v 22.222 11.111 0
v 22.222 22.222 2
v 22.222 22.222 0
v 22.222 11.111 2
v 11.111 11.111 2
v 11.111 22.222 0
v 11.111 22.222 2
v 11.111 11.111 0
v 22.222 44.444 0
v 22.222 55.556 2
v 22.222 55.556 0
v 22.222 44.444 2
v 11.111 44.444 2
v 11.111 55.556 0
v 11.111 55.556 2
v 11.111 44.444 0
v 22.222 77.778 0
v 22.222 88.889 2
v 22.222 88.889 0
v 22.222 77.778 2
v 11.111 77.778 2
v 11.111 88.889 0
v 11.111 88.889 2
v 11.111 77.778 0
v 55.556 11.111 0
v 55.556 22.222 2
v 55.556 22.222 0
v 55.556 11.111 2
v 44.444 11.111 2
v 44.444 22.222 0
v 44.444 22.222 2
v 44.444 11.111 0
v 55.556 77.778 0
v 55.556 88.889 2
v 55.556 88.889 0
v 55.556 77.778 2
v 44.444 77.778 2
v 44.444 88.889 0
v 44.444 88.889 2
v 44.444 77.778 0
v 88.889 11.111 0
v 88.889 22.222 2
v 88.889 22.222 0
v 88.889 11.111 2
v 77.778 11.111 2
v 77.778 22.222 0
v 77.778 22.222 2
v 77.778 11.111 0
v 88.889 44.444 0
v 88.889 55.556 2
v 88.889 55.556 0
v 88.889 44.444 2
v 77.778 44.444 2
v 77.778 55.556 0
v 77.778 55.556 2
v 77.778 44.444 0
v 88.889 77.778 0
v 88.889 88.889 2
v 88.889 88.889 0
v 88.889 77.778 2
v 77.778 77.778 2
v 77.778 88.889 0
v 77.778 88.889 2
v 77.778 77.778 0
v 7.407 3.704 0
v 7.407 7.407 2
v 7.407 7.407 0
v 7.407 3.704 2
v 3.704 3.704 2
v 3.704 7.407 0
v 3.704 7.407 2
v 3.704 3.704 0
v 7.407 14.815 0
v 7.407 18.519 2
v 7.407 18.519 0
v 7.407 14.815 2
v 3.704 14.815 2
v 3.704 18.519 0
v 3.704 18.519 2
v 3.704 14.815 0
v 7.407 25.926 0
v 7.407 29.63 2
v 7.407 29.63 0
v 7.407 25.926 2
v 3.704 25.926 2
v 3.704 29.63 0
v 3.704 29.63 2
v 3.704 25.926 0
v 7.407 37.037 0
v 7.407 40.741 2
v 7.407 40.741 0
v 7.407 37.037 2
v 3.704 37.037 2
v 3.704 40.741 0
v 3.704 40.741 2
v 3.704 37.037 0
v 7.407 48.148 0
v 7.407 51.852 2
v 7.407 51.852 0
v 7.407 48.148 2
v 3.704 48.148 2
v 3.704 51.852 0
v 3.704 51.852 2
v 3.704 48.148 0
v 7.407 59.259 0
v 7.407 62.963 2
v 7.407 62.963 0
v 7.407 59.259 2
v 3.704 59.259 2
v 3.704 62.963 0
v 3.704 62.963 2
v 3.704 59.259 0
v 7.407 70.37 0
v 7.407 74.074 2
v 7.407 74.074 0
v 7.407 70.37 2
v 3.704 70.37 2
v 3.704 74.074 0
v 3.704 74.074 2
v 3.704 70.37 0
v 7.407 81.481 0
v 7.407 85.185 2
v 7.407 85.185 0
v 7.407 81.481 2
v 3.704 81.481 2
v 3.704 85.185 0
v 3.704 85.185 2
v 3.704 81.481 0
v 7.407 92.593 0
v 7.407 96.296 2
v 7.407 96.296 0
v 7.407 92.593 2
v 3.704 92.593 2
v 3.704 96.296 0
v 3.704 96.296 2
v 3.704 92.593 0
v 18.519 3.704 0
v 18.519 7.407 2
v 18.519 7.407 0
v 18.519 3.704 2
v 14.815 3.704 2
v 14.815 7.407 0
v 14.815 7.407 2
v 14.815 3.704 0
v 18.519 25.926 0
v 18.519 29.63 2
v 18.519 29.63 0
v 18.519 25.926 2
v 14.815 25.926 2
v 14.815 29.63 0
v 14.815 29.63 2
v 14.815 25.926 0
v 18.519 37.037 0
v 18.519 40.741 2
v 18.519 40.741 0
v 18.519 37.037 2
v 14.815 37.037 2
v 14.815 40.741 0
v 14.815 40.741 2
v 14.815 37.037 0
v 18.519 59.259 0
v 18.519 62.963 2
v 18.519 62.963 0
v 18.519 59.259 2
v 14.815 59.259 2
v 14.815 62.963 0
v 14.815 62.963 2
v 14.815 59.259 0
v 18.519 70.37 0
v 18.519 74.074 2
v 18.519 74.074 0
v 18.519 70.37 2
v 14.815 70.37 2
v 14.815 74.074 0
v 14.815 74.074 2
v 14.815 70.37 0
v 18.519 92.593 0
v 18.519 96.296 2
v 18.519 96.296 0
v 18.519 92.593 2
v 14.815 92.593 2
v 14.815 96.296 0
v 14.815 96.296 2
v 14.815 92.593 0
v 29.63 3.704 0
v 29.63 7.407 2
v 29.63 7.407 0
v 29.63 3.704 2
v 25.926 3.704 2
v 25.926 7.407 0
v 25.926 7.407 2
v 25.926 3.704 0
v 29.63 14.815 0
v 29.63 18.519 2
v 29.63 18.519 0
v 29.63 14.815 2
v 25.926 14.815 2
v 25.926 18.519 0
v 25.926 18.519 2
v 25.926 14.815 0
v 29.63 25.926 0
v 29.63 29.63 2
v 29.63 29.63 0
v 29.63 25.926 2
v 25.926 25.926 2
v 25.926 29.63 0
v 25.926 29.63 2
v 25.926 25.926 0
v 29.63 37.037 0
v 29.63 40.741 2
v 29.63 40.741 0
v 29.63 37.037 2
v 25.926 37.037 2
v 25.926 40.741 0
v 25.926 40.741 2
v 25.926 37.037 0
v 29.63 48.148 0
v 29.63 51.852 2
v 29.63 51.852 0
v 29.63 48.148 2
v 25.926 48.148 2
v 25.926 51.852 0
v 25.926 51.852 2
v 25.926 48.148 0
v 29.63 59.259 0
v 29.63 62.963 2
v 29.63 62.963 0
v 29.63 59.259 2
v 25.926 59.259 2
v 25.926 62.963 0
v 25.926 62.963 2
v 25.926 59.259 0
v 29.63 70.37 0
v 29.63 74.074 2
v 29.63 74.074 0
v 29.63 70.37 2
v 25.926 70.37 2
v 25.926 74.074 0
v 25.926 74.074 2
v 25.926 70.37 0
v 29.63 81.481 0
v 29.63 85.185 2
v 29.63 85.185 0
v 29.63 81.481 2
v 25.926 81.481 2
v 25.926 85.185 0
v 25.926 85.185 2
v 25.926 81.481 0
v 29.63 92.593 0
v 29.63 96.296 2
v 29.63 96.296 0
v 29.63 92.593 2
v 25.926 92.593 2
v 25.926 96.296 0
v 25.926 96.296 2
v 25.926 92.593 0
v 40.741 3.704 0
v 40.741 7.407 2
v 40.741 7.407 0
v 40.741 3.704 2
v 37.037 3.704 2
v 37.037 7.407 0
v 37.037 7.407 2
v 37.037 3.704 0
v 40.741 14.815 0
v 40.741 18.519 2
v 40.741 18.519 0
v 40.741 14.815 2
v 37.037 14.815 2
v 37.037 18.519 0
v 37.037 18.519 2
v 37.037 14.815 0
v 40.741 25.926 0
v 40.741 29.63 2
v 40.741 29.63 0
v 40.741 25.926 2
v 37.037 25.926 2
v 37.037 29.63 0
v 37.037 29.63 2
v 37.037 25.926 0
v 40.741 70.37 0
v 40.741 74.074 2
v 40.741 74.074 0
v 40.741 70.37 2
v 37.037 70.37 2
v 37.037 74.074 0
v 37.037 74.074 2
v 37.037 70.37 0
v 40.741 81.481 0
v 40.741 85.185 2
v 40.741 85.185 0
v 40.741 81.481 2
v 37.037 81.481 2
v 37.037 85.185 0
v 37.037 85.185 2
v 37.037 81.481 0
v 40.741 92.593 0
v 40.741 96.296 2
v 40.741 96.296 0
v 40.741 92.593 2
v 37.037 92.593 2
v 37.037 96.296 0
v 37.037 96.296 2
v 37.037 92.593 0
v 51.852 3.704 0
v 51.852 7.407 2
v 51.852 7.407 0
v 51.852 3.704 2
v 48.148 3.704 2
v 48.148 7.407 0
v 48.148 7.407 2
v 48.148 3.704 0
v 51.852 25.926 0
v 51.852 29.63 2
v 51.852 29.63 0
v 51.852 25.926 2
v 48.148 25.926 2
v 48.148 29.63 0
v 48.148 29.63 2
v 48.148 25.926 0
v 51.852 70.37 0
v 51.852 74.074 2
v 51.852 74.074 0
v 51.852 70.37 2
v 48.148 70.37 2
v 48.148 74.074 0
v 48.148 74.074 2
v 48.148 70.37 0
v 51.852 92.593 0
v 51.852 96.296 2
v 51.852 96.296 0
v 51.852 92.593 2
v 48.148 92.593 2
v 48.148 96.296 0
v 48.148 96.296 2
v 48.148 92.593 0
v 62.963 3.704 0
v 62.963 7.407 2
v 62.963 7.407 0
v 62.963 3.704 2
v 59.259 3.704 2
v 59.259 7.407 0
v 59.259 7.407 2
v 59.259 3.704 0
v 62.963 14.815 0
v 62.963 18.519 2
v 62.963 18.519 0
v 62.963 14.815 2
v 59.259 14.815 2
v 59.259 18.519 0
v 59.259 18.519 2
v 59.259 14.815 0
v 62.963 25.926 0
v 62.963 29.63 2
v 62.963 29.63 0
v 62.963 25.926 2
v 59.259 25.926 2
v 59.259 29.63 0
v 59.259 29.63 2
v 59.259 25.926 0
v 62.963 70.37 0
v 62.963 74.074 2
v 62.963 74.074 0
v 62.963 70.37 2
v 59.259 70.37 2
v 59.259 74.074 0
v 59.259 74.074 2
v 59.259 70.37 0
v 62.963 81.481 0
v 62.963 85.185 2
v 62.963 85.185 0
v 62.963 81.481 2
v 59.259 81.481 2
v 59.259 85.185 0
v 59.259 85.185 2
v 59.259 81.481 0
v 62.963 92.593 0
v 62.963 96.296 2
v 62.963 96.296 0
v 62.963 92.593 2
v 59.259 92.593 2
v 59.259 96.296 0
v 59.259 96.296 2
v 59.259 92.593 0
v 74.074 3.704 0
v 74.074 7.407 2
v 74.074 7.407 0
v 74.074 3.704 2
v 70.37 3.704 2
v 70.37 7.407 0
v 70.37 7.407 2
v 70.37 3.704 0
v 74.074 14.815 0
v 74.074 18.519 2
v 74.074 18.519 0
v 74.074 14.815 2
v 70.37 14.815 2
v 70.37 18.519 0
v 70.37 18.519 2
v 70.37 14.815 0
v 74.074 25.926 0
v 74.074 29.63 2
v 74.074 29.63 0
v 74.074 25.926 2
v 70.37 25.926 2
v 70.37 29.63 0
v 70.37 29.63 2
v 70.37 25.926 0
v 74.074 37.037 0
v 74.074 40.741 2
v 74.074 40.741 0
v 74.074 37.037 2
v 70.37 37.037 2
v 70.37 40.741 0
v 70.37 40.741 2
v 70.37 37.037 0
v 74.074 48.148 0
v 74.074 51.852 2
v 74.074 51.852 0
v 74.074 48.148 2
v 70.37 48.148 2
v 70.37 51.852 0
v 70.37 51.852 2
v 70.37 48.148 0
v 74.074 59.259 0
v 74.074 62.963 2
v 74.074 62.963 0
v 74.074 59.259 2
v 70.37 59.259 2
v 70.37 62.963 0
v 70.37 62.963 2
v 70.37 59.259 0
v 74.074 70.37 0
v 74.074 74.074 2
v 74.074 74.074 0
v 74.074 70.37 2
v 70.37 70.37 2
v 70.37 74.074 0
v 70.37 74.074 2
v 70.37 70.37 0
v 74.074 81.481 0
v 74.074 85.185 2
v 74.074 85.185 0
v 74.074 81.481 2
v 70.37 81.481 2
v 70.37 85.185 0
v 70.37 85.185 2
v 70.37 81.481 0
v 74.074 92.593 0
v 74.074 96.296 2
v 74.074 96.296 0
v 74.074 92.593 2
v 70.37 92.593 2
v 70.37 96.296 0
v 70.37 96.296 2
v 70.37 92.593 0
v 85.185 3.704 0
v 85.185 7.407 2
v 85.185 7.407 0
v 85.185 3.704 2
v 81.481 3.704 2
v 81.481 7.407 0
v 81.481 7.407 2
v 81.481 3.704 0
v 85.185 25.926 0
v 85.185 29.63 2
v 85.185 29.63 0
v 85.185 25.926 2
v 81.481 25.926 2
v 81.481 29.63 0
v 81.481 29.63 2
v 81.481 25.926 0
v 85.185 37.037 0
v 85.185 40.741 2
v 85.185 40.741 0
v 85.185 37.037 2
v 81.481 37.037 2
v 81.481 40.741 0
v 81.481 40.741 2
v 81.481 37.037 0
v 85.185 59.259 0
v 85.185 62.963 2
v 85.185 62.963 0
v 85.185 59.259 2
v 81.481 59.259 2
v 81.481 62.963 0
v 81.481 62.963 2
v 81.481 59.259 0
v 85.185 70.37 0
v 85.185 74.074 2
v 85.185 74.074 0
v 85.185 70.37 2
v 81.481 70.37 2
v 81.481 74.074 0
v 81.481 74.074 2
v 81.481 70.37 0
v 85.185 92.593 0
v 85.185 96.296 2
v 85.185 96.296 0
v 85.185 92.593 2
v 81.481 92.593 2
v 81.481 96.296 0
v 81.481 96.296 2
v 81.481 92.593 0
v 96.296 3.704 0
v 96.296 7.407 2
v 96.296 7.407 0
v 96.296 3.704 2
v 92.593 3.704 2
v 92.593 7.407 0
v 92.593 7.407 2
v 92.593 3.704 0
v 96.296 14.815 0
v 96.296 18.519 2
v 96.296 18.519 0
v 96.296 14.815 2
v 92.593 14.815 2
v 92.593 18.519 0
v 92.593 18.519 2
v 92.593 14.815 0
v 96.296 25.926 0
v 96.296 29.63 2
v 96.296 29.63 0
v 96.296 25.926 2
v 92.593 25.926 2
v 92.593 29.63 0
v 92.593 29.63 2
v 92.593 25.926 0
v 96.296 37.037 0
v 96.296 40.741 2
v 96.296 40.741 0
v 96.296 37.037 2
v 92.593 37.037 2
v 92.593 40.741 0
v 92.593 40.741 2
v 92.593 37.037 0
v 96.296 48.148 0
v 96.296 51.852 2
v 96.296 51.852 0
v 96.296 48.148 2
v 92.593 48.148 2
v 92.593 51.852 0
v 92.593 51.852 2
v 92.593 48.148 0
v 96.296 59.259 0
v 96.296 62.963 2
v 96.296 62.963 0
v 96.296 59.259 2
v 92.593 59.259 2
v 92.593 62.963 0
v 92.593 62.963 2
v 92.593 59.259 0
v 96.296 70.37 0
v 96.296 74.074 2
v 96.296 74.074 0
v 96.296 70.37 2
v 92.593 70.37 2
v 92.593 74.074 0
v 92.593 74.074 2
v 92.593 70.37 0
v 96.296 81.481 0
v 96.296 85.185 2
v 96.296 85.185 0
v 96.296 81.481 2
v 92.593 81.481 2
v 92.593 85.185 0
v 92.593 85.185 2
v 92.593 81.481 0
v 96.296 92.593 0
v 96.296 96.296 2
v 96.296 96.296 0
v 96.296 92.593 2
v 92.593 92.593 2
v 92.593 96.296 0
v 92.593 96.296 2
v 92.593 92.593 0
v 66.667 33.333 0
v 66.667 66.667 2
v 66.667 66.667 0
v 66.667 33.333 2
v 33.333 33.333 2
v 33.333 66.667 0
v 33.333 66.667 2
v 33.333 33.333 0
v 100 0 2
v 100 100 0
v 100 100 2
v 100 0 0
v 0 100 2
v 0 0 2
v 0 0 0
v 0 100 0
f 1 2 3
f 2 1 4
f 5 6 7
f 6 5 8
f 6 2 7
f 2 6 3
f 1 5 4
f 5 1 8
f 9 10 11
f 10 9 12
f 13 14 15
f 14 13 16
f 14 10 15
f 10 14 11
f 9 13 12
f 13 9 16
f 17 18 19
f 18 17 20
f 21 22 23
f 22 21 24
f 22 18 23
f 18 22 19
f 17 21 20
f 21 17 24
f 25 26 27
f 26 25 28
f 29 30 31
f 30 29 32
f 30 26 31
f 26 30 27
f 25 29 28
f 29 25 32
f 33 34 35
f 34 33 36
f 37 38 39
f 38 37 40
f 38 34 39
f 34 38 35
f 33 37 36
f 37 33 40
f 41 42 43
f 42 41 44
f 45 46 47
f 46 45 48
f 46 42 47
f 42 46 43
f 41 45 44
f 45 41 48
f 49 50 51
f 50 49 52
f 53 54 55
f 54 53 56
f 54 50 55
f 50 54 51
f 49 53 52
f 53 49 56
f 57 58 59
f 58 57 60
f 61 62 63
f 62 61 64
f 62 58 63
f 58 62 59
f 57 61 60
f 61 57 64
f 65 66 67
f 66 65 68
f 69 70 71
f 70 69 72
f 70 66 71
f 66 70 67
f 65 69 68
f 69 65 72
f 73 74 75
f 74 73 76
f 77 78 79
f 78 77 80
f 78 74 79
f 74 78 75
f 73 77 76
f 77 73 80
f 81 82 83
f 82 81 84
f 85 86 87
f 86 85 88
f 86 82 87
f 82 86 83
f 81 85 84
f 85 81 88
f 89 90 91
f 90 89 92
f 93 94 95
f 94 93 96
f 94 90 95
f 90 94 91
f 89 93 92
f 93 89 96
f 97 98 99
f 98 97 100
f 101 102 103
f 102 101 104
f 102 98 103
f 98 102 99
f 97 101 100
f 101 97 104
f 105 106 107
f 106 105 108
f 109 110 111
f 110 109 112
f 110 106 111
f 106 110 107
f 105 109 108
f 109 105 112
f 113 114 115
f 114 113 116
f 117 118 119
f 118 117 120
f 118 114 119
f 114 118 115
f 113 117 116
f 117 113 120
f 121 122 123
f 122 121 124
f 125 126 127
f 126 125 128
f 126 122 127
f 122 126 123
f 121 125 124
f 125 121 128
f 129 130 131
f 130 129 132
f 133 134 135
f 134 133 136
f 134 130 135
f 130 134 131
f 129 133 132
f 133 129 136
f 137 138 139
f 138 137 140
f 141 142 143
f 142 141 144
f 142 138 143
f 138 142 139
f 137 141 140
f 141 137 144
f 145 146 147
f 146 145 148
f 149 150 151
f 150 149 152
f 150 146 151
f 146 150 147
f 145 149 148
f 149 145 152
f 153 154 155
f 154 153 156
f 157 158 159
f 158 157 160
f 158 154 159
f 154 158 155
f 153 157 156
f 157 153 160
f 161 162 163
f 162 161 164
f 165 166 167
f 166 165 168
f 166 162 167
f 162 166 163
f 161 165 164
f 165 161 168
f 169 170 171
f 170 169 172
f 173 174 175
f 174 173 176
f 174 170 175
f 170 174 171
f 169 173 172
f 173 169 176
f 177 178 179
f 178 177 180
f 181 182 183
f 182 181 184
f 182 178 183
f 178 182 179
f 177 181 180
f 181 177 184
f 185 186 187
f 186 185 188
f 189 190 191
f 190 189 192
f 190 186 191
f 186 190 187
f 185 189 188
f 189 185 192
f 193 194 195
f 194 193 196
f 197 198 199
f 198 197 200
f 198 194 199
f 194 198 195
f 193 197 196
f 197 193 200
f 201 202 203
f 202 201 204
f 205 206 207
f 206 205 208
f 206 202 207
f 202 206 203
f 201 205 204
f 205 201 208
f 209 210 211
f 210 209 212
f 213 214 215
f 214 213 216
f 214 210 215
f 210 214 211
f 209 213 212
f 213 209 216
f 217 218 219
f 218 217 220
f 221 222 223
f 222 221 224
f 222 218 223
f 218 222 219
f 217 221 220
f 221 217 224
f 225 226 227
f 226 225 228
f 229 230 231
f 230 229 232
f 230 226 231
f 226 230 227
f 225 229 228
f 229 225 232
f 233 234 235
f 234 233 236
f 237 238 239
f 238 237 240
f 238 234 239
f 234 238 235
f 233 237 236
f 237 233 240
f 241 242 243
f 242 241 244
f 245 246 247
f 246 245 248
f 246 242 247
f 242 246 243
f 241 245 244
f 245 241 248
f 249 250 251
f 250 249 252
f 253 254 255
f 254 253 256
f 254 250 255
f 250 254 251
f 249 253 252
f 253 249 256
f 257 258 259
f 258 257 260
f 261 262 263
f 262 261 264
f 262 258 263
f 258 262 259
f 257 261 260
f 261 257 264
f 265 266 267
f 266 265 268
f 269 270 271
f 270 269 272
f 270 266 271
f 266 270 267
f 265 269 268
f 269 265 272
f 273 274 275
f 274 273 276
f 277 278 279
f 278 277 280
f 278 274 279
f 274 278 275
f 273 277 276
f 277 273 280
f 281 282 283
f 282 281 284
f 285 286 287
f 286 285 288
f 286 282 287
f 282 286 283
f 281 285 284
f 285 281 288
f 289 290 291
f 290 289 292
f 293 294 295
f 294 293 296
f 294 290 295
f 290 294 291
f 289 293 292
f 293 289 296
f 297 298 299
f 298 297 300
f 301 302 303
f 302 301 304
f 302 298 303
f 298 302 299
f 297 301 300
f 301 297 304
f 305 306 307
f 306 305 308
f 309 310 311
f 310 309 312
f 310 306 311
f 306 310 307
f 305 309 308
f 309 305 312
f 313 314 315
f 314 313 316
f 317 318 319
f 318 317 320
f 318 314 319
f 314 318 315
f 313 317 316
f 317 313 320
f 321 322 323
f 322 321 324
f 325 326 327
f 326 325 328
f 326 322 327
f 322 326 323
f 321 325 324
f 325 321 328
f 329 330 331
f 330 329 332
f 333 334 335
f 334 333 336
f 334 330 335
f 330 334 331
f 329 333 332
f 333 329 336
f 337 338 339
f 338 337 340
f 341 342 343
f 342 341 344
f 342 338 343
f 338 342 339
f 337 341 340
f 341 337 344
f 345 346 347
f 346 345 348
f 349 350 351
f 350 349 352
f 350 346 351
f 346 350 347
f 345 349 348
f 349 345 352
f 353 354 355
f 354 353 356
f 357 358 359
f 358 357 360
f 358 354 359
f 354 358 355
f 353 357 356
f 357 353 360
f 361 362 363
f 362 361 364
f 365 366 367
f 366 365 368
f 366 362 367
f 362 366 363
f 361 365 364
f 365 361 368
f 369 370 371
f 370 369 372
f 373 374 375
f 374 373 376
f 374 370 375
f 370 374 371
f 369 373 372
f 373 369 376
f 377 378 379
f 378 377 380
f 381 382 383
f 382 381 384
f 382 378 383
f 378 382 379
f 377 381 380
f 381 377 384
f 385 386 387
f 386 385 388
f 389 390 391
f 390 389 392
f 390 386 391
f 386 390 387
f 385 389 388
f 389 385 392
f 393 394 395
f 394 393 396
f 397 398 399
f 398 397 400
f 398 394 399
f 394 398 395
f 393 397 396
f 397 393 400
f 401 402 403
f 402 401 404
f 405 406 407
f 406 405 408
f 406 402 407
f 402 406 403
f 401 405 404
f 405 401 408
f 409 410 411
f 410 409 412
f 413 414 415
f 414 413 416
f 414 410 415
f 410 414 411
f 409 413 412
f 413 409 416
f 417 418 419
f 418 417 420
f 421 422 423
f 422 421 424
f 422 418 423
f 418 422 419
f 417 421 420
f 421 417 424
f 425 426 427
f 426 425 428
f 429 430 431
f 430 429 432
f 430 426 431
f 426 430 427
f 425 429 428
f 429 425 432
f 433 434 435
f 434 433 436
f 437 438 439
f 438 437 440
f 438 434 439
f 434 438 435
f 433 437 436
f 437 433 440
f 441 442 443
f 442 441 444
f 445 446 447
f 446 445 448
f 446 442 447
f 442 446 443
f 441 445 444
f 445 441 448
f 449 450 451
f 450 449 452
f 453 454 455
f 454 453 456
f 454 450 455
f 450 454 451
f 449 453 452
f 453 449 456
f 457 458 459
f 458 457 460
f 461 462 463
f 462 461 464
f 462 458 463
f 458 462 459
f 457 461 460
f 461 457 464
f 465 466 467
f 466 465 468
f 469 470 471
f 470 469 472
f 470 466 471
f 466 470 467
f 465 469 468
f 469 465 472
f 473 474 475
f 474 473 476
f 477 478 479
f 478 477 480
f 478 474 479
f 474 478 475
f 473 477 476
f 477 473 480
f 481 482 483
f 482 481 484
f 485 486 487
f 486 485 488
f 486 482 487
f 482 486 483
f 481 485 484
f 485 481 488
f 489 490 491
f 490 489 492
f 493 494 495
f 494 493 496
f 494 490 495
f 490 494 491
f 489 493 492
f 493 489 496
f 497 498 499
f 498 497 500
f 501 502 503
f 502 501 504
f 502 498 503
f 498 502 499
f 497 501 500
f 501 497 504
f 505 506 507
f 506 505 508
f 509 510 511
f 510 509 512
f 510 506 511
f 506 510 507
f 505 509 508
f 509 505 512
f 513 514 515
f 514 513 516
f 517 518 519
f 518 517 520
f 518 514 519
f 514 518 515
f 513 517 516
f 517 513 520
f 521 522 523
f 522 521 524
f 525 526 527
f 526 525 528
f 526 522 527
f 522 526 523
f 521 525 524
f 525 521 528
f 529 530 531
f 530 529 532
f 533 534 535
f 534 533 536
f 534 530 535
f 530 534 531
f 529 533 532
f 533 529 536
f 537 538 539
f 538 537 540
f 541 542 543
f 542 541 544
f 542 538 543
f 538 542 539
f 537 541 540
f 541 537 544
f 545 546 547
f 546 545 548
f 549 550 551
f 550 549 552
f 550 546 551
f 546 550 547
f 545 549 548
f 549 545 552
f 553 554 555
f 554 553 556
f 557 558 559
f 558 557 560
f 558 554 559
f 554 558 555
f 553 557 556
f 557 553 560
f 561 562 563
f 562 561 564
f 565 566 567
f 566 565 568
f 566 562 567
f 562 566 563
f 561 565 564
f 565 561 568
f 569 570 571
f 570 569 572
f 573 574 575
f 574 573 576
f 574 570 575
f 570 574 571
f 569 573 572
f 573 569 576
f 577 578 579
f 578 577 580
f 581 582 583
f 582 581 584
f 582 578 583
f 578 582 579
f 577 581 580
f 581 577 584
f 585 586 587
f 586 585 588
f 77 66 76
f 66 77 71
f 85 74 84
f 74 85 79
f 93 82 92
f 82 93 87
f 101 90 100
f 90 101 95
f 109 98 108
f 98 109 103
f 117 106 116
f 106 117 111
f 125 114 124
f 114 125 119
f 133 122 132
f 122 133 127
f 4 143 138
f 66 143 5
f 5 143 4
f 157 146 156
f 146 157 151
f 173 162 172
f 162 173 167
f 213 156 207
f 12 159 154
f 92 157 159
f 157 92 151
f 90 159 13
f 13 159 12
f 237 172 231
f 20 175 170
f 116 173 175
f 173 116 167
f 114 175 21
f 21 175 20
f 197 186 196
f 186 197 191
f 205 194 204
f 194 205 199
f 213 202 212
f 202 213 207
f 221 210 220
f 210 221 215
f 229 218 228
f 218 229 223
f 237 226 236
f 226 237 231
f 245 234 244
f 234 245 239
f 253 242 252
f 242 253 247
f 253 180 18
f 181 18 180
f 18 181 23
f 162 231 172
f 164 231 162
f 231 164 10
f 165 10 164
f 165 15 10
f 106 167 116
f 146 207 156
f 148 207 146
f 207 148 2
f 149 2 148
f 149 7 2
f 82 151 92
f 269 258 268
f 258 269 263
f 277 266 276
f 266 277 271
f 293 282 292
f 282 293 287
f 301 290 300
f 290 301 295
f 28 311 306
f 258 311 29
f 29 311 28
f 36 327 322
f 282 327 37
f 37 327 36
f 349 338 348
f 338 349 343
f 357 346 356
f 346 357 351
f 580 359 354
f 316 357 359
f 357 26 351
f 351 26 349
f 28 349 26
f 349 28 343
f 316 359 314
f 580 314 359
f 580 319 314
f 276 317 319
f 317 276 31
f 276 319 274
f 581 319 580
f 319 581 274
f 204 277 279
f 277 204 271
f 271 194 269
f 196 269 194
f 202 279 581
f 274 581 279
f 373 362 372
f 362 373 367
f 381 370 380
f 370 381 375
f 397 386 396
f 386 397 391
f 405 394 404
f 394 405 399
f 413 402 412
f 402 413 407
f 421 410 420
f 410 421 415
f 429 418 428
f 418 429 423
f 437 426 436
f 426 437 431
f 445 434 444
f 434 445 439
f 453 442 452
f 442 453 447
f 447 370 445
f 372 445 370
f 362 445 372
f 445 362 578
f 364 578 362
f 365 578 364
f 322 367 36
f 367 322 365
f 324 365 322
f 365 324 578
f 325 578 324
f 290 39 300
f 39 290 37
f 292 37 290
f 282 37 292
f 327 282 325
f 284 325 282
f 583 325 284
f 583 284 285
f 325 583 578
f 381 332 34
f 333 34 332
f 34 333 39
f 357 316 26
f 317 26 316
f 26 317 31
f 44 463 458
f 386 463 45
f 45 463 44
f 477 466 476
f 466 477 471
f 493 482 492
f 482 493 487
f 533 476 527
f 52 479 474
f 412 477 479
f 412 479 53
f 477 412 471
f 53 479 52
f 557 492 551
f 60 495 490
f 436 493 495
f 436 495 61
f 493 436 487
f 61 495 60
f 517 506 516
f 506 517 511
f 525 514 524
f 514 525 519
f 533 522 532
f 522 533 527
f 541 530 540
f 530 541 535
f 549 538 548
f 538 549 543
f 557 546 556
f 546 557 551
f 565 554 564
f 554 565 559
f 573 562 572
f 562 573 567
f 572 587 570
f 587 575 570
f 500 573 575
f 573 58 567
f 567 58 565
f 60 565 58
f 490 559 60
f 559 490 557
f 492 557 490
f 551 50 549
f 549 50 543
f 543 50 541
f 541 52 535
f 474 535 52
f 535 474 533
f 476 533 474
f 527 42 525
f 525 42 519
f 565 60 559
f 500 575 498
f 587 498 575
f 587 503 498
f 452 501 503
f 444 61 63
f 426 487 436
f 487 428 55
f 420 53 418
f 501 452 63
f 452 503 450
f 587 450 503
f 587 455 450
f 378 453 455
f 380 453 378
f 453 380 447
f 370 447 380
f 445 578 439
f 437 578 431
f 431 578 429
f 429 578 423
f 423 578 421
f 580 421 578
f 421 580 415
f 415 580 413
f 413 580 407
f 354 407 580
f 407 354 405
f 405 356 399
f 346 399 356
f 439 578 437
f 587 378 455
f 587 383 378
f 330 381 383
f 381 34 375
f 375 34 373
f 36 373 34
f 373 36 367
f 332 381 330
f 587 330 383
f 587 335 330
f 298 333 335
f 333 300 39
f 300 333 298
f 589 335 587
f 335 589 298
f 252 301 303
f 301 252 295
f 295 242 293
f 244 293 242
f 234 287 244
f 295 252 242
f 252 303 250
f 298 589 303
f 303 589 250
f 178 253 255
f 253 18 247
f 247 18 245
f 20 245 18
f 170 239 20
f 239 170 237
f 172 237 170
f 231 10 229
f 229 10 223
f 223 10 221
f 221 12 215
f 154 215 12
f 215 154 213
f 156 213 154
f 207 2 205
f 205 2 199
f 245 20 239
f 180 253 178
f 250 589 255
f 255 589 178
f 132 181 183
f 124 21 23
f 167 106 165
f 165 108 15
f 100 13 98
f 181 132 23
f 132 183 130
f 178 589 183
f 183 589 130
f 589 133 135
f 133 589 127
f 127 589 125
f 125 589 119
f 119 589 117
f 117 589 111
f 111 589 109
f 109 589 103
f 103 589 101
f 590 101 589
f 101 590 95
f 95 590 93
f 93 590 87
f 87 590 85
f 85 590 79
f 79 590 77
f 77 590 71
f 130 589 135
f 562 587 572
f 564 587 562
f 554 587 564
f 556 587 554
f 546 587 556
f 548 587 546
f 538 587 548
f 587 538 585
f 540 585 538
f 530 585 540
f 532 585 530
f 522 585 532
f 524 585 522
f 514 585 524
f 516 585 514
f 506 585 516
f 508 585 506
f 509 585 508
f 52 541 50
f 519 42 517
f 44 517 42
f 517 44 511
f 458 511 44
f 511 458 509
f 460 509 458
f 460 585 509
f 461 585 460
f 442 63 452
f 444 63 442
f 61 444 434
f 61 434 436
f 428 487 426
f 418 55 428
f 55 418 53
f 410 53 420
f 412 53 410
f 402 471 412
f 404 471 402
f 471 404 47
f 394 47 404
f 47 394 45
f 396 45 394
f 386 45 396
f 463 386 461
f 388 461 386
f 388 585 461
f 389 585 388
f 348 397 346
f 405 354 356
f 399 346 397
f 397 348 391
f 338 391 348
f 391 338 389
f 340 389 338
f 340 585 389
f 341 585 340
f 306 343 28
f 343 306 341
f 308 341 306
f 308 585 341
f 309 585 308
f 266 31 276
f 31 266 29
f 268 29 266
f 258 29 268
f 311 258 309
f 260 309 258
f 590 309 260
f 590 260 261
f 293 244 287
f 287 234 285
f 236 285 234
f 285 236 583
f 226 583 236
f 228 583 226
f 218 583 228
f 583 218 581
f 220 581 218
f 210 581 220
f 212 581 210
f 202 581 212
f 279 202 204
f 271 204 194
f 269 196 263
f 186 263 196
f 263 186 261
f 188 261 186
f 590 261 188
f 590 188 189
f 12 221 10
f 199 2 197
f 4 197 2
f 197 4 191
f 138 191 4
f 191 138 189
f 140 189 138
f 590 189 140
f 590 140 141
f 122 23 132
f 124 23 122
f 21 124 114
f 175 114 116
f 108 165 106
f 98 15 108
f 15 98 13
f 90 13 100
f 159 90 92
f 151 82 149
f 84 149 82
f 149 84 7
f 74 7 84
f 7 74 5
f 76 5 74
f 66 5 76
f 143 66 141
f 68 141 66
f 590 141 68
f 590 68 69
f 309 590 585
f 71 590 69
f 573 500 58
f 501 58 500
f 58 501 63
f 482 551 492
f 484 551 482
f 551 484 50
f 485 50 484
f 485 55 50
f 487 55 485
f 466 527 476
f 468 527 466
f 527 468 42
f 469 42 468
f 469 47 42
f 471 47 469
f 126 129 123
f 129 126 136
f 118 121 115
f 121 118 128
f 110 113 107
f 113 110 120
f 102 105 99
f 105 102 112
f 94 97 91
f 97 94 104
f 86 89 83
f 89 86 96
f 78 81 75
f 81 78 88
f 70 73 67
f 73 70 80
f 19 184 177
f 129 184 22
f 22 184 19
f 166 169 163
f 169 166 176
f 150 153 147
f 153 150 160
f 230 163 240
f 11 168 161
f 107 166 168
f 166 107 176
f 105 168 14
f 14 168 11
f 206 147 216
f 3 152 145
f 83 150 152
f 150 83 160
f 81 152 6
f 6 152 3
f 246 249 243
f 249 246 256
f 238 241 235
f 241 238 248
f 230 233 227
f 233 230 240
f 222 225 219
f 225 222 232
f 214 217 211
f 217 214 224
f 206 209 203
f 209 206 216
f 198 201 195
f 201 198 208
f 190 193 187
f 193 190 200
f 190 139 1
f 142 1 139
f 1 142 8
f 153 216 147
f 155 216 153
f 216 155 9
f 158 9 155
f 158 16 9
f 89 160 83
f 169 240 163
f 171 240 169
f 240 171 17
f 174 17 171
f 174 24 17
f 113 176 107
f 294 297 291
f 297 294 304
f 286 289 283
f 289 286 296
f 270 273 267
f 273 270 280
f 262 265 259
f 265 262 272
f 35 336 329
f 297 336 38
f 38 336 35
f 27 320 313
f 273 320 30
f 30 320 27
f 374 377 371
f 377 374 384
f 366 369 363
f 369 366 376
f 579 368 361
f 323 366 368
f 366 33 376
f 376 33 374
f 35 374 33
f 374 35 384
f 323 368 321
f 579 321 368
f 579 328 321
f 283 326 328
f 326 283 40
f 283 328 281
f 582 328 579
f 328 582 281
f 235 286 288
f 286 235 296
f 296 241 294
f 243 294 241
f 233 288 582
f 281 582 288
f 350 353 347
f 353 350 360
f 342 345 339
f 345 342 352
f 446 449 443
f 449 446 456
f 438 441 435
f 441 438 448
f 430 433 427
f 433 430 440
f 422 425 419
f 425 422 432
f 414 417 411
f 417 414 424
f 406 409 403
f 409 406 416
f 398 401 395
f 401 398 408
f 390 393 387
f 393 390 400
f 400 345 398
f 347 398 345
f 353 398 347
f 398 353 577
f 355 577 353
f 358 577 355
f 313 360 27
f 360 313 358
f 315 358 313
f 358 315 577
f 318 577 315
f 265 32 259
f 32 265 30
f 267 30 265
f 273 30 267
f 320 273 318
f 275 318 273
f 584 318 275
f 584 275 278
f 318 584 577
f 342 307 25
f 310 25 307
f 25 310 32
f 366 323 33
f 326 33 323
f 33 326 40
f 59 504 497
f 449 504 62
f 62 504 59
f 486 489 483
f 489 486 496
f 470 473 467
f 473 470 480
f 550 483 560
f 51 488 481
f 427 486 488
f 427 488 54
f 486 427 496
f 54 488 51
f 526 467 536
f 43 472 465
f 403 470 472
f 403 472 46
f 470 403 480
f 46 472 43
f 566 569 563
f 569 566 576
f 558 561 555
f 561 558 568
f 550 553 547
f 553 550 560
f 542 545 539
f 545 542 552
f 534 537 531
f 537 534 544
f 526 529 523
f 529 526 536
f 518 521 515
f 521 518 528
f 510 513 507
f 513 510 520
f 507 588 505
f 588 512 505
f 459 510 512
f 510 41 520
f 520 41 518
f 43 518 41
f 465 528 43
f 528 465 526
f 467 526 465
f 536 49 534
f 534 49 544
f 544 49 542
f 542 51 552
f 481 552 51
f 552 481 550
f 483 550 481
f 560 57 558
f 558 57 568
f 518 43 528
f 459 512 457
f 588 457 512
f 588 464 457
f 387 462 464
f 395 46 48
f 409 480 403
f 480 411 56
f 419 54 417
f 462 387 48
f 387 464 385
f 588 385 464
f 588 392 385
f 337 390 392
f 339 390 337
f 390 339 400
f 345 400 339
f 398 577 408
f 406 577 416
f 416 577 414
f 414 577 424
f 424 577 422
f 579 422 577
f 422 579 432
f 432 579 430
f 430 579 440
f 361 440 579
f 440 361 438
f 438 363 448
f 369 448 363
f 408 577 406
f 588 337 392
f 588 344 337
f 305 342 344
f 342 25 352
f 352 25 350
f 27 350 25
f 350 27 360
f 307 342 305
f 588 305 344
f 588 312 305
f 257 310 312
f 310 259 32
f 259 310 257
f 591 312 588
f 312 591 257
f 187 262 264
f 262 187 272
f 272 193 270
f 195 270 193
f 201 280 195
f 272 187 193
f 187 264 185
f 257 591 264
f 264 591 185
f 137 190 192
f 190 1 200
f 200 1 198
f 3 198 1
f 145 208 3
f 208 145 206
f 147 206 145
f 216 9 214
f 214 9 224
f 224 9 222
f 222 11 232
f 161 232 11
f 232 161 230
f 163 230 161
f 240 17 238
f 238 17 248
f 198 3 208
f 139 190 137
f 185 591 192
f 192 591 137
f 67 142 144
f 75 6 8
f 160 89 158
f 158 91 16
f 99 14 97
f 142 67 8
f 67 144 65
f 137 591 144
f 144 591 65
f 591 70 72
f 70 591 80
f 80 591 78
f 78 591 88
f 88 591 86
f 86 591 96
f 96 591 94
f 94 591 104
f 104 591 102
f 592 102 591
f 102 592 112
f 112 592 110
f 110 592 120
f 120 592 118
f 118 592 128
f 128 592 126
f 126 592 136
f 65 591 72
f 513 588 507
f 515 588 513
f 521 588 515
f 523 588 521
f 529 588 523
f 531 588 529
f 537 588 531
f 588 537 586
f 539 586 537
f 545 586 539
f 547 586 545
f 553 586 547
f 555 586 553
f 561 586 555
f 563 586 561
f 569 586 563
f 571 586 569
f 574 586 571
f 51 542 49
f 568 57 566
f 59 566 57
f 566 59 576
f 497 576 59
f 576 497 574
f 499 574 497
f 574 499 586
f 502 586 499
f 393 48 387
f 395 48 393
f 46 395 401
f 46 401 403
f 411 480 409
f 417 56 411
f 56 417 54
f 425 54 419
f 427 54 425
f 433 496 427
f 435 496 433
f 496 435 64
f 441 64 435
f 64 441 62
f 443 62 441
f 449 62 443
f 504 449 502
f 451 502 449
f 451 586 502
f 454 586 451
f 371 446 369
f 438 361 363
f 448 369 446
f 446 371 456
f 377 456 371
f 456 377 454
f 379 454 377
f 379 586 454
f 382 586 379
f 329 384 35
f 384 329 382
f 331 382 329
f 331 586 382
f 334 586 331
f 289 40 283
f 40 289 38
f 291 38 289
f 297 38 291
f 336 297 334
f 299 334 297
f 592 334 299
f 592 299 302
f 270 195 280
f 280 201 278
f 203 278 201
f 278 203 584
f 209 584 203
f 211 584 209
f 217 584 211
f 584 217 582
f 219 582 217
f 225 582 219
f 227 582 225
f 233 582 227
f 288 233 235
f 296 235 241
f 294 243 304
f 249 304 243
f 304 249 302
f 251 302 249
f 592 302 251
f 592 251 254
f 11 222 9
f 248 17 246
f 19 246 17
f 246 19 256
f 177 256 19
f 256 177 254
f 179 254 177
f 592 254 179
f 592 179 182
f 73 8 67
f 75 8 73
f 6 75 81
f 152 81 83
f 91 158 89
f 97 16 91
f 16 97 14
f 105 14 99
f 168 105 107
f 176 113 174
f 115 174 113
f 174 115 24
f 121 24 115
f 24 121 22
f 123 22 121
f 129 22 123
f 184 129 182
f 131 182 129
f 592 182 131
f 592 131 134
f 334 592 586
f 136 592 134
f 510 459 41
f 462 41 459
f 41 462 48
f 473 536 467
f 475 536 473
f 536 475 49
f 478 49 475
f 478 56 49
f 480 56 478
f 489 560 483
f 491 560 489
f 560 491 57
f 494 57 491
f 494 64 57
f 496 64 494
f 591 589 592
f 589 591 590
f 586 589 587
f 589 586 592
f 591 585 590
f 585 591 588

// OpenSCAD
//Preview function works decently up to level 5 (though it takes a minute); Render function has trouble above level 3

side = 100;
height = 2;
level = 3;

difference(){
    cube([side, side, height]);
    cuts();
}
module cuts(){
    for (i = [1:level]){
        w = side/pow(3,i);
        for (x = [1.5*w:3*w:side-w], y = [1.5*w:3*w:side-w]) {
          translate([x,y,-height])cube([w,w,height*5],center=true);
        }
    }
}
